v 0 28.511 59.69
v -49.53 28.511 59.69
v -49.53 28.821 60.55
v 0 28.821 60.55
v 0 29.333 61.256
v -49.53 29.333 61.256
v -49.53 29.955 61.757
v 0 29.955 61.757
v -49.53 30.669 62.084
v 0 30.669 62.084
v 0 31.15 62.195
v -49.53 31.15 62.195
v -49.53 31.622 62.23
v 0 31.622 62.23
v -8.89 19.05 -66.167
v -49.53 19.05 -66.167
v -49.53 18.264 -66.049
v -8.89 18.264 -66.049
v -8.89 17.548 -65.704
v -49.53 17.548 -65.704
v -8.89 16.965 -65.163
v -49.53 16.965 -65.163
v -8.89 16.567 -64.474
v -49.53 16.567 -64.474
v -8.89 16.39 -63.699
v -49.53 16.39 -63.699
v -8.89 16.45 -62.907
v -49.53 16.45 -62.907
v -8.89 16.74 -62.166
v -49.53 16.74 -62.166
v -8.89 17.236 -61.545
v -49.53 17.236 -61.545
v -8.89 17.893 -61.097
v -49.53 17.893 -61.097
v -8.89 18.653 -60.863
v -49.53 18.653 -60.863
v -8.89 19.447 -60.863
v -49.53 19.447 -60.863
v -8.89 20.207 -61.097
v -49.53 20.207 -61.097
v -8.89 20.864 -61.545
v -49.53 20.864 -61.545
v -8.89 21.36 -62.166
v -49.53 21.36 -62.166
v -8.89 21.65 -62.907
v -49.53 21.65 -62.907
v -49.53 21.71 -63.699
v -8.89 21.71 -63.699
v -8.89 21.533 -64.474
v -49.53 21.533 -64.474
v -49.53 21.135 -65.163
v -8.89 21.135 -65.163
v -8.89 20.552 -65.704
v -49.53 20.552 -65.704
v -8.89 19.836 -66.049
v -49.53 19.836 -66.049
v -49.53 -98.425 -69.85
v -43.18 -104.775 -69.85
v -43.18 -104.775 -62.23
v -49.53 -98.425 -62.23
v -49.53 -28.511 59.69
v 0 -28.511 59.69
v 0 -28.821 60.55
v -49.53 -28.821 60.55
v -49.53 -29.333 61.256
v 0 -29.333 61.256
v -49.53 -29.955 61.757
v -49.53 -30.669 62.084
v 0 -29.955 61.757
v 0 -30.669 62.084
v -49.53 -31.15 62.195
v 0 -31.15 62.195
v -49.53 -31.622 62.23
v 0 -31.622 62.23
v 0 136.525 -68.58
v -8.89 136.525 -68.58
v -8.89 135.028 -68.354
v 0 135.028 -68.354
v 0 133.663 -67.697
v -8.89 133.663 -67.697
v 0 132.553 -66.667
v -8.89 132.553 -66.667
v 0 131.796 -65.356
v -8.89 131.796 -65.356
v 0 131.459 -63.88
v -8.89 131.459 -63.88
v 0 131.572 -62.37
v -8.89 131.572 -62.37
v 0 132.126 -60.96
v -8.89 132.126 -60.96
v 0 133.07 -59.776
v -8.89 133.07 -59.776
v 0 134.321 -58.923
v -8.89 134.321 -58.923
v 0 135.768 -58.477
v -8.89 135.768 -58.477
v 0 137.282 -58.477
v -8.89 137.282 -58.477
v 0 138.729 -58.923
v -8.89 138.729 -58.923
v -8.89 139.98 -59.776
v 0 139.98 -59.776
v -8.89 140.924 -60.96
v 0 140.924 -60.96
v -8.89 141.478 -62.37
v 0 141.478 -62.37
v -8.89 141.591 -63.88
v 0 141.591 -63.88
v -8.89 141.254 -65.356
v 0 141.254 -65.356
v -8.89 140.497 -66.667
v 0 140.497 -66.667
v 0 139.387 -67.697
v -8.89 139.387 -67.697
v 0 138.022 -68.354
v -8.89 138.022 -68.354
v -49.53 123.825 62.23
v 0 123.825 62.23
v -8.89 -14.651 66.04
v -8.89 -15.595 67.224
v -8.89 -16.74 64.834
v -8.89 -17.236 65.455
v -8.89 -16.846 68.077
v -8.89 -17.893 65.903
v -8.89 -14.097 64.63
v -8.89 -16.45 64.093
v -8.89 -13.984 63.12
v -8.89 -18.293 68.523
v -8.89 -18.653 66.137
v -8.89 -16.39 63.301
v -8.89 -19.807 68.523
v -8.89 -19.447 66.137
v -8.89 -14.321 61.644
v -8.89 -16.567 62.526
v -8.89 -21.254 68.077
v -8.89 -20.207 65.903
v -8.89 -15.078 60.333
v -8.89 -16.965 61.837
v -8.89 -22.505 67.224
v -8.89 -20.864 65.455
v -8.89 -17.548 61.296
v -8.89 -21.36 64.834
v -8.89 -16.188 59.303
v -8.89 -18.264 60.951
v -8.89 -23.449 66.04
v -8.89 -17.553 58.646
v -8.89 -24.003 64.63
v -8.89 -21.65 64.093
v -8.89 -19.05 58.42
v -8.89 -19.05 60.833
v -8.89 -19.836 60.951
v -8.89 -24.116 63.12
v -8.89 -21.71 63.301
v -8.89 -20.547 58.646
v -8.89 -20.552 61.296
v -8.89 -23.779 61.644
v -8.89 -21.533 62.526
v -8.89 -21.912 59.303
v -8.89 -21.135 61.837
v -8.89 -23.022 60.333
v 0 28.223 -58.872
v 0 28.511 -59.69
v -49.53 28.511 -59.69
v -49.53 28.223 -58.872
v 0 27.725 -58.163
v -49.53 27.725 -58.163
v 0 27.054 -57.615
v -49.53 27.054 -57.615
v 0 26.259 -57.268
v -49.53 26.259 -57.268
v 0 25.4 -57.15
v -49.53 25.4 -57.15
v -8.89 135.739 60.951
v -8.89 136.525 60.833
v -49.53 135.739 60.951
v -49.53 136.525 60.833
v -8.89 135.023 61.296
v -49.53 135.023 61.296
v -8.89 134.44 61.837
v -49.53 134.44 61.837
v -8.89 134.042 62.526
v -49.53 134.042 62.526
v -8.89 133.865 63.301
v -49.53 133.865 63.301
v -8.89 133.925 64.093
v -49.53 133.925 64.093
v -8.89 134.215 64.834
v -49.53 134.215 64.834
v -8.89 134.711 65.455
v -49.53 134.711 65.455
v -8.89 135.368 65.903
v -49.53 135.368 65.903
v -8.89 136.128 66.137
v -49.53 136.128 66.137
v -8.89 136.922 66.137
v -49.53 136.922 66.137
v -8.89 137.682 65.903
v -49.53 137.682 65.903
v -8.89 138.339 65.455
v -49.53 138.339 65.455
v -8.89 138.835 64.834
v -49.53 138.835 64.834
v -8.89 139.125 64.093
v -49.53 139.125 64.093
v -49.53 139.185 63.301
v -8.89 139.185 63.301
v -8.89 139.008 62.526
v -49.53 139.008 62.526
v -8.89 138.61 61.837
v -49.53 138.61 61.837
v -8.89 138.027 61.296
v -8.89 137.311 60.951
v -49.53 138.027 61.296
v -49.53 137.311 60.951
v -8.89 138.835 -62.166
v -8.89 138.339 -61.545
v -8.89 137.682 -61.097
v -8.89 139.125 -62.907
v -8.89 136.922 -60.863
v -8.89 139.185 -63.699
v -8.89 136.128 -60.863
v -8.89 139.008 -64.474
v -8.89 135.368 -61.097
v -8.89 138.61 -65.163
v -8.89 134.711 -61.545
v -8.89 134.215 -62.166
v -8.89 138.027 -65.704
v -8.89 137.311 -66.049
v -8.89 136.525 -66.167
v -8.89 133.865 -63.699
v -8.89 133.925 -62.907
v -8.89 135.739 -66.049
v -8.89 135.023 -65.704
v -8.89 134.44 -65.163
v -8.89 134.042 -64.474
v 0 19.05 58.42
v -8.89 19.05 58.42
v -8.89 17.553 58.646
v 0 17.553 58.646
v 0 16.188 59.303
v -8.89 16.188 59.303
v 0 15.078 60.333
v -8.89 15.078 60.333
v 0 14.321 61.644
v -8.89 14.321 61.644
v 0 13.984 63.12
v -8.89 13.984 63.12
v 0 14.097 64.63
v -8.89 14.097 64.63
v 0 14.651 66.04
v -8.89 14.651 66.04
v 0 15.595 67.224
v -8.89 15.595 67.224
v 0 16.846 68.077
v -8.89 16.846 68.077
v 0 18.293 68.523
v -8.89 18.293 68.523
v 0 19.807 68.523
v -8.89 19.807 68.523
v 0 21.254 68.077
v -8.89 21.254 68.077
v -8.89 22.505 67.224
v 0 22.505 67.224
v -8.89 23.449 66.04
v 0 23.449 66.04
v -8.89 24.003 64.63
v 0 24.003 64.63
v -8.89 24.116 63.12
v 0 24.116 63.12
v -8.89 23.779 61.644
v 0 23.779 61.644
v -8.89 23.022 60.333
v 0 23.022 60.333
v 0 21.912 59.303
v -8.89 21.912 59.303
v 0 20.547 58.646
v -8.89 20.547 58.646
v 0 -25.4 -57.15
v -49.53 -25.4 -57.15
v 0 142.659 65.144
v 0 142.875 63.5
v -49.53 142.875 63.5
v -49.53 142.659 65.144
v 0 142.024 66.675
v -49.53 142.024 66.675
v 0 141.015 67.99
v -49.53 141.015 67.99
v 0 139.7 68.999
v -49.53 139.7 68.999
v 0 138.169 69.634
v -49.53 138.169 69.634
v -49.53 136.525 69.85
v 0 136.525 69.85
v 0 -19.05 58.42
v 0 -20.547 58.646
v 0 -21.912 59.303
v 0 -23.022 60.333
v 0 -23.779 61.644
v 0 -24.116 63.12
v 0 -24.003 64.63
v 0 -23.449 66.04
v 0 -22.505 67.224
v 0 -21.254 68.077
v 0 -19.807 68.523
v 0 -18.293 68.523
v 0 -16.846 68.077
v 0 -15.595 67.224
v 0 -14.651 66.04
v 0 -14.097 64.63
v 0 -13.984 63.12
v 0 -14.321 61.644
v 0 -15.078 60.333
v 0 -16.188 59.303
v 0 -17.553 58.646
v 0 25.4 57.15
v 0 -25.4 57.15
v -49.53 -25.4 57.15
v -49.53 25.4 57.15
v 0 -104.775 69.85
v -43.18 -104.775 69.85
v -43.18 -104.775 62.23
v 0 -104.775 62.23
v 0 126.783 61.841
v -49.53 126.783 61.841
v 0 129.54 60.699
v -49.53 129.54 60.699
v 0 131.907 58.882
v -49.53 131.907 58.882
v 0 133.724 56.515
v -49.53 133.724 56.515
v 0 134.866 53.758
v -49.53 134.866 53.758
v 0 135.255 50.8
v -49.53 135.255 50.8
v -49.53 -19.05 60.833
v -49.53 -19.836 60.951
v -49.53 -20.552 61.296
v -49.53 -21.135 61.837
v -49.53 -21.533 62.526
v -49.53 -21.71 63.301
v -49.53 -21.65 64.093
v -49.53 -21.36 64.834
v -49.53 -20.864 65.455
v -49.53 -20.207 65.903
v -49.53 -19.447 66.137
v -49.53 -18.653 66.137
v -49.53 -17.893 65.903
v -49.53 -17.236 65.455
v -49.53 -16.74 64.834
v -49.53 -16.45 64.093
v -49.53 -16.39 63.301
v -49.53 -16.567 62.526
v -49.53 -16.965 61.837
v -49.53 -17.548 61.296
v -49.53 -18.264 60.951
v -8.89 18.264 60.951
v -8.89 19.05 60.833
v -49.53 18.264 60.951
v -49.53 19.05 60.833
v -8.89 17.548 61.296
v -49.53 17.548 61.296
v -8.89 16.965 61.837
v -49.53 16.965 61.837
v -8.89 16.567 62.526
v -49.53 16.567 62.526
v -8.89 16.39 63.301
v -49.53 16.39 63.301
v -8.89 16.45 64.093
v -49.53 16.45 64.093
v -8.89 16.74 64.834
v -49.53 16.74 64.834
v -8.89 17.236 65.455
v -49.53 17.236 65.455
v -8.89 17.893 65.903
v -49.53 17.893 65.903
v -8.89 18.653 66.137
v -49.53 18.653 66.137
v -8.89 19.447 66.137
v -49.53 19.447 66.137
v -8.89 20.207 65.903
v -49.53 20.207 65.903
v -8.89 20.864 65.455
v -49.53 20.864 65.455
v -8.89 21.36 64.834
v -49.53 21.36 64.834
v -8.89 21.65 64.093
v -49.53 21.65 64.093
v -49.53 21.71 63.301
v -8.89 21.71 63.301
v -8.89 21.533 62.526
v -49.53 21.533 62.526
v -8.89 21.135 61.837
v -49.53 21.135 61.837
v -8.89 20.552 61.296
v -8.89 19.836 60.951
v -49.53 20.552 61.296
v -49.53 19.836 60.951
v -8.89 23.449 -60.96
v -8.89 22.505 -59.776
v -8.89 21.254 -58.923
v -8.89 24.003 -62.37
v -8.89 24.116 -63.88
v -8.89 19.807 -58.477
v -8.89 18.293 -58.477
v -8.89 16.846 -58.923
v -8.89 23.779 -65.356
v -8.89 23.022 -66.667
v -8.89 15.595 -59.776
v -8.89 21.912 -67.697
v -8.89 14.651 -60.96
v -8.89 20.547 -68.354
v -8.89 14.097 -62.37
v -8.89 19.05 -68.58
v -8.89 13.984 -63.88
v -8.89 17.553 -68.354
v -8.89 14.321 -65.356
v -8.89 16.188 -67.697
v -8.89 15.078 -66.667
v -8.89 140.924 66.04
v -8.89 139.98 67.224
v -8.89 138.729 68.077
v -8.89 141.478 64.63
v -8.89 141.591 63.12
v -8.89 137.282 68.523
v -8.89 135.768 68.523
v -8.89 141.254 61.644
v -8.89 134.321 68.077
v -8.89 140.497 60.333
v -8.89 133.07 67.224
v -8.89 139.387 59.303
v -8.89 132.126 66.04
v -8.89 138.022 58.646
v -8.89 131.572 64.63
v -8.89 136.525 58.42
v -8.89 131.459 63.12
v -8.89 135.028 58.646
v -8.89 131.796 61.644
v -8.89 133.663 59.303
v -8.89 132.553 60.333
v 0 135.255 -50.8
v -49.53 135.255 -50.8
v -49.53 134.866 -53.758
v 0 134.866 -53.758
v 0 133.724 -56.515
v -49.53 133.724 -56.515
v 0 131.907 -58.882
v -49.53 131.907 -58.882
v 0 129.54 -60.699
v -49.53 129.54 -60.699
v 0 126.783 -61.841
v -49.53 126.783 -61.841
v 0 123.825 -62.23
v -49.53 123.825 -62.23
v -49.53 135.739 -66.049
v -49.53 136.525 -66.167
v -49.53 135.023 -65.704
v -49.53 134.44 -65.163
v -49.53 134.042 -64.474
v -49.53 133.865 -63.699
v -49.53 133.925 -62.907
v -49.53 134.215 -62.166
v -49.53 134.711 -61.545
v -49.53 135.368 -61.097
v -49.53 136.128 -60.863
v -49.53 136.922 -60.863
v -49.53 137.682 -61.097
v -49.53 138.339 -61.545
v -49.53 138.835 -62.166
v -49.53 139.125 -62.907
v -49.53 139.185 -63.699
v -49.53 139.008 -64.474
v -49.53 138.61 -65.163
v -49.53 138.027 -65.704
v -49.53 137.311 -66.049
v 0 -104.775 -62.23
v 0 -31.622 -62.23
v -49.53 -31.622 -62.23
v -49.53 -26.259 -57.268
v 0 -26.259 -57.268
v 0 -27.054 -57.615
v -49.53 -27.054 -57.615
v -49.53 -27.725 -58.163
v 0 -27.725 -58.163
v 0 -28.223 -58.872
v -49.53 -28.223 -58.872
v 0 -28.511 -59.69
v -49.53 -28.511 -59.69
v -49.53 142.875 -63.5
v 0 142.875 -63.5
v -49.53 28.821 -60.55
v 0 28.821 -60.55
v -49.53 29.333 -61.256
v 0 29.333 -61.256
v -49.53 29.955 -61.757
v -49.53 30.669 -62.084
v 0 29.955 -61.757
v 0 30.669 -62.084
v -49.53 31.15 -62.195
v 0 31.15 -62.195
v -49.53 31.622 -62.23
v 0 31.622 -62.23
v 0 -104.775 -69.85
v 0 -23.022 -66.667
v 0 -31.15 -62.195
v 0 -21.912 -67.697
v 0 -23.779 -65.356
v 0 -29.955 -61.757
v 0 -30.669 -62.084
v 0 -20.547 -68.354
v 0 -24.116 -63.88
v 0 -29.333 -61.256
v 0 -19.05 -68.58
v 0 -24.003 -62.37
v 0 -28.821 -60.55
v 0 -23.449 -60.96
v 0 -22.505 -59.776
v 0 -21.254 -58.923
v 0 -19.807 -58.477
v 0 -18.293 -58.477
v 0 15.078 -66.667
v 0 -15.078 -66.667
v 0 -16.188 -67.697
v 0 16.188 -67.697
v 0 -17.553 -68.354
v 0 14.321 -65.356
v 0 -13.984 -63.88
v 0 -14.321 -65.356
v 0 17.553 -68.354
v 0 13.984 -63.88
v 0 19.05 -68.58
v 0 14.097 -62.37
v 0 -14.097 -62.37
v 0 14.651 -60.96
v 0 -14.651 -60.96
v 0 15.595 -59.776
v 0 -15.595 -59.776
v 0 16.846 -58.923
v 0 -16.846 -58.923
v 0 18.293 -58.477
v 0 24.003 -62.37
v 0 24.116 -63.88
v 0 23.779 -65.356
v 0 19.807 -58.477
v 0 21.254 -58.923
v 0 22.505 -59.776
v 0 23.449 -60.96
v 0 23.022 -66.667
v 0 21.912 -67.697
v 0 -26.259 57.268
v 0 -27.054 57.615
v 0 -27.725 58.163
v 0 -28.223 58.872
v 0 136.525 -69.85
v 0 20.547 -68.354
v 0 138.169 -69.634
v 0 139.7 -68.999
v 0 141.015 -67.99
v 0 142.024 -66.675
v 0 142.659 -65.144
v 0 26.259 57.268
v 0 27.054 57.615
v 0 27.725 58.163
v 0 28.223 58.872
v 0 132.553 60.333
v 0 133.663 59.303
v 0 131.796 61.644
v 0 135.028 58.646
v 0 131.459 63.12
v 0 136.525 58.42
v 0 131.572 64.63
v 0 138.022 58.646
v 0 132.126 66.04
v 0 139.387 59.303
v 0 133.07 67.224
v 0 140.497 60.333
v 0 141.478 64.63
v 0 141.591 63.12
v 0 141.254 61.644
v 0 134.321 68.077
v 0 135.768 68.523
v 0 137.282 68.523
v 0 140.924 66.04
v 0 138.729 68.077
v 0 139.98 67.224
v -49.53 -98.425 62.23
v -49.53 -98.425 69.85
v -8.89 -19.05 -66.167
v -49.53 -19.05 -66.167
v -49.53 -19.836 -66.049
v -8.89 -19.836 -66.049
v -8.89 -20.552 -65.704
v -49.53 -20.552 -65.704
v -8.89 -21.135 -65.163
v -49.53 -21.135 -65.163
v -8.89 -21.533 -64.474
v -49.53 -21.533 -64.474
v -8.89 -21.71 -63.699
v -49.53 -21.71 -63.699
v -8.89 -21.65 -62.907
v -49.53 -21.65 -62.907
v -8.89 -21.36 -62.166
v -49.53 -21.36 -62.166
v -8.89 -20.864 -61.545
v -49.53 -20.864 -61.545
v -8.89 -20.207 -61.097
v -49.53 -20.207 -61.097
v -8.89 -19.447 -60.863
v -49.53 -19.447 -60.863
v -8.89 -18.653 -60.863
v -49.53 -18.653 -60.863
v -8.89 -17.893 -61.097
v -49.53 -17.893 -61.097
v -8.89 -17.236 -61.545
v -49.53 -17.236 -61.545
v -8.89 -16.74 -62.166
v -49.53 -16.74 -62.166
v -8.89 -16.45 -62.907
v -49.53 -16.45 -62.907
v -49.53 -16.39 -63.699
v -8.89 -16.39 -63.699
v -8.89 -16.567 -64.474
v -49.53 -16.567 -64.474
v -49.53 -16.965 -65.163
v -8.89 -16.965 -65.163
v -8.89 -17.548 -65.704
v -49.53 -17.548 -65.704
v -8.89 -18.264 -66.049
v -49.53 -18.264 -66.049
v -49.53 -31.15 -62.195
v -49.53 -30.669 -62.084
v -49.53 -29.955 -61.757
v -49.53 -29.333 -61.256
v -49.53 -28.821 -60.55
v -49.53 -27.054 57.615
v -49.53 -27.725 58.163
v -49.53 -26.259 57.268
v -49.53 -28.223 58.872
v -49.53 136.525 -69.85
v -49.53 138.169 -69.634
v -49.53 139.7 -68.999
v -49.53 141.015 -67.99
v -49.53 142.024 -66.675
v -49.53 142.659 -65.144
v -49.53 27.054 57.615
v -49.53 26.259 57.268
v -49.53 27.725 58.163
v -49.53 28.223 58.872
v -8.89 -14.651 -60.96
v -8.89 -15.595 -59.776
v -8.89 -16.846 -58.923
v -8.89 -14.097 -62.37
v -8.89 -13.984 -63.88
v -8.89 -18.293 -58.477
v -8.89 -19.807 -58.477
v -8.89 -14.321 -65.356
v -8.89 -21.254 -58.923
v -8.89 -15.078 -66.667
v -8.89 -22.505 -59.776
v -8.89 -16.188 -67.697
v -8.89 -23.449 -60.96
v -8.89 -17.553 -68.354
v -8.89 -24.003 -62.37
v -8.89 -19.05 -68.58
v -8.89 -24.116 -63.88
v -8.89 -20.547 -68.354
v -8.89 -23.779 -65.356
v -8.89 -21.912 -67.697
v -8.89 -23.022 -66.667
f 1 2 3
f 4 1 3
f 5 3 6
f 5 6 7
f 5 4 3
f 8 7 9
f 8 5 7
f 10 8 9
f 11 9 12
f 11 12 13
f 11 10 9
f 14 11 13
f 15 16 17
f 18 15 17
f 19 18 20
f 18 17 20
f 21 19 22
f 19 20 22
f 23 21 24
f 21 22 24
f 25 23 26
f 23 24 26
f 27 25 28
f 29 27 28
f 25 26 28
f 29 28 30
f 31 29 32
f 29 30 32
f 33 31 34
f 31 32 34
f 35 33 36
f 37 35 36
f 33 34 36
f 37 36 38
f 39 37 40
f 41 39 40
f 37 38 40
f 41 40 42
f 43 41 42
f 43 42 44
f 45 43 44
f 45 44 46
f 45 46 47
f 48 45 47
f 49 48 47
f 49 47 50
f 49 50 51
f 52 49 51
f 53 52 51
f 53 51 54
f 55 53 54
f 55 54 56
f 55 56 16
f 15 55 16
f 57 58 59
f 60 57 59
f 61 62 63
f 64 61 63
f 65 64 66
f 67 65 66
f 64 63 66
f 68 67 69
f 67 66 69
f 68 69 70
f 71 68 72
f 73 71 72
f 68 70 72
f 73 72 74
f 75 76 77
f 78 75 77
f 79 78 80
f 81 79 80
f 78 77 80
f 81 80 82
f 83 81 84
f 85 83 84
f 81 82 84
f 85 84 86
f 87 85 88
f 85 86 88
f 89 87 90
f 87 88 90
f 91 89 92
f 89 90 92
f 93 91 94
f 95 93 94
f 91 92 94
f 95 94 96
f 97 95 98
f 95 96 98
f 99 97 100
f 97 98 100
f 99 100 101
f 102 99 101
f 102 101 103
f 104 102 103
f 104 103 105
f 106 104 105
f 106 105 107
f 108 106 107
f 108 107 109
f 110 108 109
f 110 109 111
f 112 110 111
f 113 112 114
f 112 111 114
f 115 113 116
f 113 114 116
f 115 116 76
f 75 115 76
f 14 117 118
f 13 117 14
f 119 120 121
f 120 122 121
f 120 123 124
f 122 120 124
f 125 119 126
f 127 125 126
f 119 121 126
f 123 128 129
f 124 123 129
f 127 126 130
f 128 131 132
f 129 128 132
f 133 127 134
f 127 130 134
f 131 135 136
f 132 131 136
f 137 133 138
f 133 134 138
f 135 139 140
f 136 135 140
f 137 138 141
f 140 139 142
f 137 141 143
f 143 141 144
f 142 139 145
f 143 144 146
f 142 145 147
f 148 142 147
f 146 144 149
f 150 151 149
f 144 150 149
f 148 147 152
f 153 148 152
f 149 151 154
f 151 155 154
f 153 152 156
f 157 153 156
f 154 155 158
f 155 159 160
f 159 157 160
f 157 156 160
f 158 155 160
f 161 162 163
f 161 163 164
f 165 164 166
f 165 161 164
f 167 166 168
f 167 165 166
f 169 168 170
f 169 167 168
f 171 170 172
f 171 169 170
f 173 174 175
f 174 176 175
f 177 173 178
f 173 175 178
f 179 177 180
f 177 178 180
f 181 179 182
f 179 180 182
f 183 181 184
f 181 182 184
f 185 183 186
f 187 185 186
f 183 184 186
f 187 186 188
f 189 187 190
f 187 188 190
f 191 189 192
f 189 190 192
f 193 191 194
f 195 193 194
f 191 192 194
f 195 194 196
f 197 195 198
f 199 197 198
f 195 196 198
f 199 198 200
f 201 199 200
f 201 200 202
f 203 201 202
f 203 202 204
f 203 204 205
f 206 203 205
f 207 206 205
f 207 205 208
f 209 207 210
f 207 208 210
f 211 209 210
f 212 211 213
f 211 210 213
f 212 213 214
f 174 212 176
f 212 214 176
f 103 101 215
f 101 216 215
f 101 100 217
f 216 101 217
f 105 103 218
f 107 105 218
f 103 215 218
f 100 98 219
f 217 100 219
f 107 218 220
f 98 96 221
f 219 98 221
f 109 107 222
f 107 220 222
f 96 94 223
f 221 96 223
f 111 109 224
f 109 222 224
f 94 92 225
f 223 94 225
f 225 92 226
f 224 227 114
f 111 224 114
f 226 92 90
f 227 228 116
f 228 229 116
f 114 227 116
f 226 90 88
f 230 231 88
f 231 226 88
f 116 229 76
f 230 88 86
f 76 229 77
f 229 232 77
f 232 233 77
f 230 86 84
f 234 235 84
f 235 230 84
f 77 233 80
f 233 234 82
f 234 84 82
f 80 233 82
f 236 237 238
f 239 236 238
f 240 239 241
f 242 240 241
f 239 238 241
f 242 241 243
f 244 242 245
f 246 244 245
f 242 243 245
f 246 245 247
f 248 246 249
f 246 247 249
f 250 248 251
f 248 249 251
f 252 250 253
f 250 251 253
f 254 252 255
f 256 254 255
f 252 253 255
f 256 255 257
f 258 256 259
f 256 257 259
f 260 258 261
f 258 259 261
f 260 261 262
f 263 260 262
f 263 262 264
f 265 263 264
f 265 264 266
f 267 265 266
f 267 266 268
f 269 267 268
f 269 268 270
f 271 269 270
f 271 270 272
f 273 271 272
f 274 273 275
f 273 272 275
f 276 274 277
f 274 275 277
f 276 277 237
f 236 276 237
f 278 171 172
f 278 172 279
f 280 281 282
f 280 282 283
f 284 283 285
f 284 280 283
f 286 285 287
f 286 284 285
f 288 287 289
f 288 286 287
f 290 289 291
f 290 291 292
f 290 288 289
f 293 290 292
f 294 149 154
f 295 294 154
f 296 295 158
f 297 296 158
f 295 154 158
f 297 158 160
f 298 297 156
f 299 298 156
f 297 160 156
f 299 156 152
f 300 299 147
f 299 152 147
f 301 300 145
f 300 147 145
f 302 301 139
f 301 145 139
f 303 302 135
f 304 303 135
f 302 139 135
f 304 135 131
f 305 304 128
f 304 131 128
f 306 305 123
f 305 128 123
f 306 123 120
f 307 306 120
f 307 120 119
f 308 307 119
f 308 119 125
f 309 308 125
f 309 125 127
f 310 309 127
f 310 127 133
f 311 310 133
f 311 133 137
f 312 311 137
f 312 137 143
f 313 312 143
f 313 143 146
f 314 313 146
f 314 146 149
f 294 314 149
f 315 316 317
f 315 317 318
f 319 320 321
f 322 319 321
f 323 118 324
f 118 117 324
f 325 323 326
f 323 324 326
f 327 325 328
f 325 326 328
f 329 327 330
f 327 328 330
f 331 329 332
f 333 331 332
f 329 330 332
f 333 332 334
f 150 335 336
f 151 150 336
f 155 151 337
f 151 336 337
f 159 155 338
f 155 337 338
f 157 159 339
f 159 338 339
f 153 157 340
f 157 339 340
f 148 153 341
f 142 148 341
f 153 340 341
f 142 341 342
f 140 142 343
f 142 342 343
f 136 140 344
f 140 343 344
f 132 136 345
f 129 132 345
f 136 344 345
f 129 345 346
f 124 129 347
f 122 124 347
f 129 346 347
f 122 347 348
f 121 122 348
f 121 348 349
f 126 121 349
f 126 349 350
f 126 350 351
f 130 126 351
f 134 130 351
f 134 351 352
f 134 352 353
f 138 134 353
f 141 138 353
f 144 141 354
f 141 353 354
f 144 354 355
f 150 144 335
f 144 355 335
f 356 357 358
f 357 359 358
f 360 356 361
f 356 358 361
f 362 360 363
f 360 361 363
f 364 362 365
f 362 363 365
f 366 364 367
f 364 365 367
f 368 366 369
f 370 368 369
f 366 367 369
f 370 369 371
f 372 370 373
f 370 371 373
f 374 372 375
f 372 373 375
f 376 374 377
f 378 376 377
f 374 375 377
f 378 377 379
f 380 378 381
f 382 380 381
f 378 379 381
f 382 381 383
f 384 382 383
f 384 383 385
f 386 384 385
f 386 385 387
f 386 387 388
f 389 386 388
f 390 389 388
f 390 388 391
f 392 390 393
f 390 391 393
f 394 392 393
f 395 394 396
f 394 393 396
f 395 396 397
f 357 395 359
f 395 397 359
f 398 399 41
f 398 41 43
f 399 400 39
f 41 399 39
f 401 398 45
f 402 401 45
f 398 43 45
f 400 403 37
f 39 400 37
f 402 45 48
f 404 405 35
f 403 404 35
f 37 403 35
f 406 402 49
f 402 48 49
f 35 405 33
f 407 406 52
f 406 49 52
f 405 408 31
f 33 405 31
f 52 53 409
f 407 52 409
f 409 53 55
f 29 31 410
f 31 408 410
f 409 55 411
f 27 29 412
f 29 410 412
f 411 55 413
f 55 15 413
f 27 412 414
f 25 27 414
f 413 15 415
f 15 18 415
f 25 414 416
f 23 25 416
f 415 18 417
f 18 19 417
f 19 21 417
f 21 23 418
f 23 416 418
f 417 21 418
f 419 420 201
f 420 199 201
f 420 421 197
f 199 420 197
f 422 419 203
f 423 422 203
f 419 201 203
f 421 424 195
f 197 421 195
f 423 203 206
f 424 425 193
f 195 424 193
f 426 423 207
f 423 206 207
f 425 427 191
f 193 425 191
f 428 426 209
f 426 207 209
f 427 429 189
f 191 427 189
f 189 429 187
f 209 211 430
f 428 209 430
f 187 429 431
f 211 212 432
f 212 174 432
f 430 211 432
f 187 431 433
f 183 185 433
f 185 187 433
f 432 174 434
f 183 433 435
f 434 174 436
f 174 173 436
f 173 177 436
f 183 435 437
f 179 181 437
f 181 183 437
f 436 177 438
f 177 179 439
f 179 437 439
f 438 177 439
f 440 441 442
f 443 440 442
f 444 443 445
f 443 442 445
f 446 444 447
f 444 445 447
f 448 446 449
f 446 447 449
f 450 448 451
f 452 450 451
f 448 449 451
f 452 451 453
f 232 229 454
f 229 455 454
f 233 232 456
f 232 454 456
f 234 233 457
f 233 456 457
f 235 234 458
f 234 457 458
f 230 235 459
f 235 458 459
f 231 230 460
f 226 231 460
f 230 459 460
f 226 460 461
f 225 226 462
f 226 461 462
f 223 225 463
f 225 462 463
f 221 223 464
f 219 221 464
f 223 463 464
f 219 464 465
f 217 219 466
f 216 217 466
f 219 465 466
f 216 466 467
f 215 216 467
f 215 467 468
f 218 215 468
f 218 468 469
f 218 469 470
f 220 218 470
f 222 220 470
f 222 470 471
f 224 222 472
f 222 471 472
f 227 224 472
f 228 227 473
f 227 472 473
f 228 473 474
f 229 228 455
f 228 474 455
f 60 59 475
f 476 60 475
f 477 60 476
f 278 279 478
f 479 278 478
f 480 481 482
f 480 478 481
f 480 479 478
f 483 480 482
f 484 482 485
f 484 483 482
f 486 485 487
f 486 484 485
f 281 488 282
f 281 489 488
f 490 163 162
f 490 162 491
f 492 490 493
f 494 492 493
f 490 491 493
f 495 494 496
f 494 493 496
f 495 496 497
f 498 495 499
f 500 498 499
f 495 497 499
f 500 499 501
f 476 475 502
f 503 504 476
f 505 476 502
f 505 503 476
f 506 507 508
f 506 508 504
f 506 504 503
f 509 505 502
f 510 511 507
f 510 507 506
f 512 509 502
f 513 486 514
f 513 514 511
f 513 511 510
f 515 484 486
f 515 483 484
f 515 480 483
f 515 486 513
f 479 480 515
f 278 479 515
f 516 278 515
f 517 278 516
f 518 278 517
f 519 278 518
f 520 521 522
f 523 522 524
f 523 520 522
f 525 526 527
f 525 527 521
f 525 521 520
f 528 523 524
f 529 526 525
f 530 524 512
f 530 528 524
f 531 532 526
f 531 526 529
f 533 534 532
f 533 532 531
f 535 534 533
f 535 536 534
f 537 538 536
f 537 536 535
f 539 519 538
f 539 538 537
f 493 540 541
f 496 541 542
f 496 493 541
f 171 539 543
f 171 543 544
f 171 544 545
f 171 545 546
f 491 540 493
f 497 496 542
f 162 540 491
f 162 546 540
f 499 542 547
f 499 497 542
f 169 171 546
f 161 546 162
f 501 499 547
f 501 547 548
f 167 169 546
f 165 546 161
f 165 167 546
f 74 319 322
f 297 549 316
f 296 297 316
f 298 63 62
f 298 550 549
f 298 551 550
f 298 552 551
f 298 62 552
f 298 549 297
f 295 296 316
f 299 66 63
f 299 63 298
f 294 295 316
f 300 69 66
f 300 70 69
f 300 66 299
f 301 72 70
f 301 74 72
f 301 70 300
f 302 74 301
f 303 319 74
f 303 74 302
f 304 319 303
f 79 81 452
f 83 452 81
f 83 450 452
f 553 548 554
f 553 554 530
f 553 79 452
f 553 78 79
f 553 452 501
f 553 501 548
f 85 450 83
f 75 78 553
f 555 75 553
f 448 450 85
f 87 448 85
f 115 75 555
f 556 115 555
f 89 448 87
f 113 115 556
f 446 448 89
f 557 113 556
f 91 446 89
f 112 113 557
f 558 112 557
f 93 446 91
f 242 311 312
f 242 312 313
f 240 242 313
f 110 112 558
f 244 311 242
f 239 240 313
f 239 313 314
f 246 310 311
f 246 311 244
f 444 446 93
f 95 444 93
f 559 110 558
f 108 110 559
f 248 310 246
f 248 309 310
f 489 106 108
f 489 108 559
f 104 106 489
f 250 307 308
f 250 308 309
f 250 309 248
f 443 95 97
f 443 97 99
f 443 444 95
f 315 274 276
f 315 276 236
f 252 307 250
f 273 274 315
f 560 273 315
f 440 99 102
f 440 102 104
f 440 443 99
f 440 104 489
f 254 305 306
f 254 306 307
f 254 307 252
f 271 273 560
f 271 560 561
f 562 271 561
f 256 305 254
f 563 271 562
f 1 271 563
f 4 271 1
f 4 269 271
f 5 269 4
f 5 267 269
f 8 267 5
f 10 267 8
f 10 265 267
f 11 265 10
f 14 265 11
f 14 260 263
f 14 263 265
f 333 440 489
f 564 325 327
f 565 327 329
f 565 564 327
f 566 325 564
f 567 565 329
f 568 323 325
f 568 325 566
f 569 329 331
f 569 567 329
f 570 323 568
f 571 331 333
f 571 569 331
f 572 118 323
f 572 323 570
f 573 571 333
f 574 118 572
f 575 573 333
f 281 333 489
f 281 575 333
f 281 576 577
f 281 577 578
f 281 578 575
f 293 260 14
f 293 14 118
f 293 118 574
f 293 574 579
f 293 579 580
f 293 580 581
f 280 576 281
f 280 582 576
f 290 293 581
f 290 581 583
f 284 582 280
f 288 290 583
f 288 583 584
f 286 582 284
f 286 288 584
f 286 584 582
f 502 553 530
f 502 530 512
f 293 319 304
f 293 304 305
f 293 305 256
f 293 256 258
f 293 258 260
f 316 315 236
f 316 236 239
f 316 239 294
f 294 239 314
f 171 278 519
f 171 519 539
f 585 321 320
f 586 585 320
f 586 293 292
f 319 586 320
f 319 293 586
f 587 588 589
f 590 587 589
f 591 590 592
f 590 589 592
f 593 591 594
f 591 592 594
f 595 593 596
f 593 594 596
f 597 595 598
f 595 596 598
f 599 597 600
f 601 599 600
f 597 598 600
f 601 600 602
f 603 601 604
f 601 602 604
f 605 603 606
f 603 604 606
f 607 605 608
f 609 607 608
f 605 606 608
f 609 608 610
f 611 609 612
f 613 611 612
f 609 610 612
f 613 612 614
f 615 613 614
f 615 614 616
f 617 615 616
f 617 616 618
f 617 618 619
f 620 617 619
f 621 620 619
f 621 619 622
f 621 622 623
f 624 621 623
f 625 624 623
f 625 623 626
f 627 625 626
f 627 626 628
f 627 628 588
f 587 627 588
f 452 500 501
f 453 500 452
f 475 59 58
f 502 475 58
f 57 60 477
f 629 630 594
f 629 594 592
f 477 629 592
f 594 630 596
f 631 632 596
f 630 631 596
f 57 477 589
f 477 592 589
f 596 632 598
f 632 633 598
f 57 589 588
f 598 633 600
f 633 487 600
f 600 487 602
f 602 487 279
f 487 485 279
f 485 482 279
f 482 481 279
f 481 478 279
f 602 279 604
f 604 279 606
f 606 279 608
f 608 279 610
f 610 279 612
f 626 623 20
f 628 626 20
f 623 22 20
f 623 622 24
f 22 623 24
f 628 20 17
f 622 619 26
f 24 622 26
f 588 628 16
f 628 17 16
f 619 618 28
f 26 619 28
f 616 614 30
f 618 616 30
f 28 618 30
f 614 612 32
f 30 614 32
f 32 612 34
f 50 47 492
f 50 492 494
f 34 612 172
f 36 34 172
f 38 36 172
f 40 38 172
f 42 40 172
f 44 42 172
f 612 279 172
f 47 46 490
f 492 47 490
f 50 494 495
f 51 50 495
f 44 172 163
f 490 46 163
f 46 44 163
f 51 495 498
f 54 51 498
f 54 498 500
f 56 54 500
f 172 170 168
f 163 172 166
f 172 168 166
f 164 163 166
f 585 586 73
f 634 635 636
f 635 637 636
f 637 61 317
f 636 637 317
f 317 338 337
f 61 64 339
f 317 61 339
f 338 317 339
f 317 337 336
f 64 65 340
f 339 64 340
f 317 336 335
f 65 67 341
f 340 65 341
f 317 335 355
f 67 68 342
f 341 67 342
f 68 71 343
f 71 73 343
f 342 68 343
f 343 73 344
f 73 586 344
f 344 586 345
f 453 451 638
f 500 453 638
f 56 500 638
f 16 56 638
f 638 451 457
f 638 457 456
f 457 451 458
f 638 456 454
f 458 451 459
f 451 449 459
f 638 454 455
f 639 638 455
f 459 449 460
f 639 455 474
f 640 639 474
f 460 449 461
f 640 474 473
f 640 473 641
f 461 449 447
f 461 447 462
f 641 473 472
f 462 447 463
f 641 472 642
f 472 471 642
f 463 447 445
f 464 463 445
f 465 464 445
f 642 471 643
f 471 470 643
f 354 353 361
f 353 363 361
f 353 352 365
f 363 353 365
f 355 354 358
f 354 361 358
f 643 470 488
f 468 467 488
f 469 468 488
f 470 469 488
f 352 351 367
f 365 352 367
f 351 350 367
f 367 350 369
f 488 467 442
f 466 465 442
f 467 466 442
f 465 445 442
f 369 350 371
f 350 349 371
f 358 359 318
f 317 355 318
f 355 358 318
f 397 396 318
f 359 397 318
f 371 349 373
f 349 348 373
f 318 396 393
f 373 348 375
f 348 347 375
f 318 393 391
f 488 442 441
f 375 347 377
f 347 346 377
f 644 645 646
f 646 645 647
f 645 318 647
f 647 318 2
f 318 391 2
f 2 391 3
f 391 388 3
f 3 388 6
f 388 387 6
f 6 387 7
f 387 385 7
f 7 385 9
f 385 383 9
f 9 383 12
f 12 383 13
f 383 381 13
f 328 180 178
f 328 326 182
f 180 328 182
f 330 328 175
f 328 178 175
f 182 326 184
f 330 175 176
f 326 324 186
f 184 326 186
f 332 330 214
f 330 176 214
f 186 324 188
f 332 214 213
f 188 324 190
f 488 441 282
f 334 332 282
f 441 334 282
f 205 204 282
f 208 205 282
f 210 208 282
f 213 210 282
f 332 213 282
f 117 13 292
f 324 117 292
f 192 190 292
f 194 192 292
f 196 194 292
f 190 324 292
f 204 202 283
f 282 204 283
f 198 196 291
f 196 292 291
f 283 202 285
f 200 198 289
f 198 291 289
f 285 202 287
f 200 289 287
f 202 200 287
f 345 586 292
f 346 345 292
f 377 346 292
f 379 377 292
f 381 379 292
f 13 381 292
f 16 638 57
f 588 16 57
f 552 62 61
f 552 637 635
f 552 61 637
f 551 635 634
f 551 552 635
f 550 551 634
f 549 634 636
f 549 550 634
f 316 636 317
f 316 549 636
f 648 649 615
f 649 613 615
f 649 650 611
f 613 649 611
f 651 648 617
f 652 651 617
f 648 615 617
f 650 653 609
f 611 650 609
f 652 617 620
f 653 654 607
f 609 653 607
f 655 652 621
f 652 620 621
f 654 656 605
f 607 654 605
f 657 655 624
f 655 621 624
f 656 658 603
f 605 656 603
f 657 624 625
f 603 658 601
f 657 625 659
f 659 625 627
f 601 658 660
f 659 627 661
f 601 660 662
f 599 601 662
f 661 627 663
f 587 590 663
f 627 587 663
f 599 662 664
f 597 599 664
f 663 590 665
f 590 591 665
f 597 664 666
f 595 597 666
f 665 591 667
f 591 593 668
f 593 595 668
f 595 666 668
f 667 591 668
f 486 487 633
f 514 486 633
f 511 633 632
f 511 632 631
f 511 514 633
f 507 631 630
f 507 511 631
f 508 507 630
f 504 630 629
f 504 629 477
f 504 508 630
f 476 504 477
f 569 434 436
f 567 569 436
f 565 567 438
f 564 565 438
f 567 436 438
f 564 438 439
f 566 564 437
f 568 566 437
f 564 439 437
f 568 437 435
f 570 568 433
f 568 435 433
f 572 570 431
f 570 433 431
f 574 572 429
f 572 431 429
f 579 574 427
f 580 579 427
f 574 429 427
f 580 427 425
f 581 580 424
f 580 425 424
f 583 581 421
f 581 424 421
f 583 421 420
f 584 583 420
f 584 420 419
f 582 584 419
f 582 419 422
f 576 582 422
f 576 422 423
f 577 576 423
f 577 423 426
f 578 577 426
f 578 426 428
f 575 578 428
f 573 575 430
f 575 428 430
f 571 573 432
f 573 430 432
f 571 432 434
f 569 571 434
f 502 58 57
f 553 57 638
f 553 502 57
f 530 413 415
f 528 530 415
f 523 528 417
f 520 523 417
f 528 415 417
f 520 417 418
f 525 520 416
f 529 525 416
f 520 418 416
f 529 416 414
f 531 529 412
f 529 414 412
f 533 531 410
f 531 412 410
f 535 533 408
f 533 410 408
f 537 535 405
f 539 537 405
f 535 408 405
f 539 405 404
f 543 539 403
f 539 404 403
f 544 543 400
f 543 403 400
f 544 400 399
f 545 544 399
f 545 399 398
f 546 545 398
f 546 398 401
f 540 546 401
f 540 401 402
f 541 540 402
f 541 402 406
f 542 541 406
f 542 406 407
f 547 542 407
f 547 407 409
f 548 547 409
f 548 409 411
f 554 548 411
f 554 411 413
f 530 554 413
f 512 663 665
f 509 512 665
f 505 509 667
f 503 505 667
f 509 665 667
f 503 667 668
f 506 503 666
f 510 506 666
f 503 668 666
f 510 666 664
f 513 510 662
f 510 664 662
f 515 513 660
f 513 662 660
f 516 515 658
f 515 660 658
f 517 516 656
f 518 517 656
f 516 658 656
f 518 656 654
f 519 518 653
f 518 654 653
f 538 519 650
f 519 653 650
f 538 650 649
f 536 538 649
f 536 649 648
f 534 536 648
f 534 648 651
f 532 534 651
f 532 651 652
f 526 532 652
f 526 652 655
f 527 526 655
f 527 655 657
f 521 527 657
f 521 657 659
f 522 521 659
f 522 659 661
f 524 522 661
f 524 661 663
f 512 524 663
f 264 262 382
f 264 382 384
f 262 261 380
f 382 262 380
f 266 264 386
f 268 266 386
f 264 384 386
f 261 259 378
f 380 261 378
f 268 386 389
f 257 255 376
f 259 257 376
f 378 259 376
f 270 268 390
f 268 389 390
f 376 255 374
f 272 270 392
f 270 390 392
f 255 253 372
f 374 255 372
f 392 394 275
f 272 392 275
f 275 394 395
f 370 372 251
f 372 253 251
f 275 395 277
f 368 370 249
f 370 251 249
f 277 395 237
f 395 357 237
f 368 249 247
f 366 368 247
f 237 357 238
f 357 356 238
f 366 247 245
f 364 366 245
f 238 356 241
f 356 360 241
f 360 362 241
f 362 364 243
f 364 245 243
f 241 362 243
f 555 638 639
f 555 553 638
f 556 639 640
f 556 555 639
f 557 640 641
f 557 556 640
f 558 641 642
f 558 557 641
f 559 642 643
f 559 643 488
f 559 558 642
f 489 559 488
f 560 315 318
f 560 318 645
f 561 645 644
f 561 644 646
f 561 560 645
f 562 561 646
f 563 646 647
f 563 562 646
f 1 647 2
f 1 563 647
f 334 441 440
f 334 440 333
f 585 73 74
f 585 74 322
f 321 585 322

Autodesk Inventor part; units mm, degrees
ref_plane "YZ Plane" through (0, 0, 0) normal (1, 0, 0) x (0, 1, 0)
ref_plane "XZ Plane" through (0, 0, 0) normal (0, 1, 0) x (-1, 0, 0)
ref_plane "XY Plane" through (0, 0, 0) normal (0, 0, 1) x (1, 0, 0)
sketch "Sketch1" plane through (0, 0, 0) normal (1, 0, 0) x (0, 1, 0)
  line L0 (0, 99.6312) -> (0, -99.6312) projected
  line L1 (-202.2597, 0) -> (204.2274, 0) projected
  line L2 (-136.525, -69.85) -> (136.525, -69.85)
  line L3 (142.875, -63.5) -> (142.875, 63.5)
  line L4 (136.525, 69.85) -> (-136.525, 69.85)
  line L5 (-142.875, 63.5) -> (-142.875, -63.5)
  line L6 (-142.875, -69.85) -> (142.875, 69.85) construction
  line L7 (142.875, -69.85) -> (-142.875, 69.85) construction
  arc A0 (142.875, 63.5) -> (136.525, 69.85) centre (136.525, 63.5) ccw
  arc A1 (136.525, -69.85) -> (142.875, -63.5) centre (136.525, -63.5) ccw
  arc A2 (-142.875, -63.5) -> (-136.525, -69.85) centre (-136.525, -63.5) ccw
  arc A3 (-136.525, 69.85) -> (-142.875, 63.5) centre (-136.525, 63.5) ccw
  line L8 (130.175, 57.15) -> (130.175, -57.15)
  line L9 (130.175, -57.15) -> (-130.175, -57.15)
  line L10 (-130.175, -57.15) -> (-130.175, 57.15)
  line L11 (-130.175, 57.15) -> (130.175, 57.15)
  line L12 (-136.525, 63.5) -> (136.525, 63.5) construction
  line L13 (136.525, 63.5) -> (136.525, -63.5) construction
  line L14 (136.525, -63.5) -> (-136.525, -63.5) construction
  line L15 (-136.525, -63.5) -> (-136.525, 63.5) construction
  line L16 (-136.525, 63.5) -> (136.525, -63.5) construction
  line L17 (136.525, 63.5) -> (-136.525, -63.5) construction
  point P0 (0, 0)
  point P1 (19.05, 63.5)
  point P2 (19.05, -63.5)
  point P3 (-19.05, 63.5)
  point P4 (-19.05, -63.5)
  dimension "d0" = 139.7
  dimension "d1" = 285.75
  dimension "d2" = 6.35
  dimension "d3" = 12.7
  dimension "d4" = 6.35
  dimension "d5" = 6.35
  dimension "d6" = 19.05
  dimension "d7" = 19.05
extrude "Extrusion1" add sketch "Sketch1" against normal blind 49.53 contours L4 A0 L3 L1 L8 L11 L0 | L0 L11 L10 L1 L5 A3 L4 | L9 L8 L1 L3 A1 L2 L0 | L0 L2 A2 L5 L1 L10 L9
fillet "Fillet1" radius 6.35 4 edges at (-24.765, 130.175, 57.15) (-24.765, 130.175, -57.15) (-24.765, -130.175, -57.15) (-24.765, -130.175, 57.15)
hole "Hole1" at (0, 136.525, 63.5) at (0, 136.525, -63.5) at (0, 19.05, 63.5) at (0, 19.05, -63.5) at (0, -19.05, 63.5) at (0, -19.05, -63.5) at (0, -136.525, 63.5) at (0, -136.525, -63.5) direction (-1, 0, 0) diameter 5.334 end through all counterbore diameter 10.16 counterbore depth 8.89
sketch "Sketch2" plane through (-49.53, 0, 0) normal (-1, 0, 0) x (0, 0, 1)
  line L0 (0, -202.2597) -> (0, 204.2274) projected
  line L1 (99.6312, 0) -> (-99.6312, 0) projected
  line L2 (119.4093, -203.1024) -> (-119.4093, -203.1024)
  line L3 (-119.4093, -203.1024) -> (-119.4093, 0)
  line L4 (-119.4093, 0) -> (119.4093, 0)
  line L5 (119.4093, 0) -> (119.4093, -203.1024)
  line L6 (119.4093, -203.1024) -> (-119.4093, 0) construction
  line L7 (-119.4093, -203.1024) -> (119.4093, 0) construction
  point P0 (0, 0)
  point P1 (0, -101.5512)
  point P2 (119.4093, 0)
  dimension "d18" = 0
extrude "Extrusion2" [suppressed]
sketch "Sketch3" plane through (-34.925, 0, -69.85) normal (0, -1, 0) x (1, 0, 0)
  line L0 (0, 12.7) -> (34.925, 12.7) projected
  line L1 (0, 0) -> (0, 12.7) projected
  line L2 (34.925, 0) -> (0, 0) projected
  line L3 (34.925, 12.7) -> (34.925, 0) projected
  line L4 (34.925, 127) -> (0, 127) projected
  line L5 (34.925, 139.7) -> (34.925, 127) projected
  line L6 (0, 139.7) -> (34.925, 139.7) projected
  line L7 (0, 127) -> (0, 139.7) projected
  line L8 (0, 133.35) -> (0, 6.35) construction
  line L9 (34.925, 6.35) -> (0, 6.35) construction
  line L10 (0, 6.35) -> (34.925, 6.35) construction
  line L11 (0, 133.35) -> (34.925, 133.35) construction
  line L12 (34.925, 135.417) -> (34.925, 131.283) construction
  line L13 (34.925, 133.35) -> (0, 133.35) construction
  point P0 (34.925, 69.85)
  point P1 (7.62, 6.35)
  point P2 (27.305, 6.35)
  point P3 (27.305, 133.35)
  point P4 (7.62, 133.35)
  dimension "d21" = 7.62
  dimension "d22" = 7.62
  dimension "d23" = 7.62
  dimension "d24" = 7.62
hole "Hole2" [suppressed]
chamfer "Chamfer1" [suppressed]
sketch "Sketch4" plane through (-49.53, 0, 0) normal (-1, 0, 0) x (0, 0, 1)
  line L0 (0, -202.2597) -> (0, 204.2274) projected
  line L1 (99.6312, 0) -> (-99.6312, 0) projected
  line L2 (116.354, -104.775) -> (-116.354, -104.775)
  line L3 (-116.354, -104.775) -> (-116.354, -199.2224)
  line L4 (-116.354, -199.2224) -> (116.354, -199.2224)
  line L5 (116.354, -199.2224) -> (116.354, -104.775)
  line L6 (116.354, -104.775) -> (-116.354, -199.2224) construction
  line L7 (-116.354, -104.775) -> (116.354, -199.2224) construction
  line L8 (63.5, 142.875) -> (-63.5, 142.875) projected
  point P0 (0, 0)
  point P1 (0, -151.9987)
  dimension "d35" = 247.65
extrude "Extrusion3" cut sketch "Sketch4" against normal through all
sketch "Sketch5" plane through (-49.53, 0, 0) normal (-1, 0, 0) x (0, 0, 1)
  line L0 (-57.15, -104.775) -> (-57.15, 123.825) projected
  line L1 (-50.8, 130.175) -> (50.8, 130.175) projected
  line L2 (57.15, 123.825) -> (57.15, -104.775) projected
  line L3 (0, -202.2597) -> (0, 204.2274) projected
  arc A0 (-50.8, 130.175) -> (-57.15, 123.825) centre (-50.8, 123.825) ccw projected
  arc A1 (57.15, 123.825) -> (50.8, 130.175) centre (50.8, 123.825) ccw projected
  line L4 (-62.23, -104.775) -> (-62.23, 123.825)
  arc A2 (-50.8, 135.255) -> (-62.23, 123.825) centre (-50.8, 123.825) ccw
  line L5 (-50.8, 135.255) -> (50.8, 135.255)
  arc A3 (62.23, 123.825) -> (50.8, 135.255) centre (50.8, 123.825) ccw
  line L6 (62.23, 123.825) -> (62.23, -104.775)
  line L7 (62.23, -28.575) -> (-62.23, -28.575)
  line L8 (-62.23, -28.575) -> (-62.23, 28.575)
  line L9 (-62.23, 28.575) -> (62.23, 28.575)
  line L10 (62.23, 28.575) -> (62.23, -28.575)
  line L11 (62.23, -28.575) -> (-62.23, 28.575) construction
  line L12 (-62.23, -28.575) -> (62.23, 28.575) construction
  line L13 (-69.85, -104.775) -> (-57.15, -104.775) projected
  line L14 (57.15, -104.775) -> (69.85, -104.775) projected
  point P0 (0, 0)
  point P1 (57.15, 28.575)
  point P2 (-57.15, 28.575)
  point P3 (57.15, -28.575)
  point P4 (-57.15, -28.575)
  dimension "d38" = 5.08
  dimension "d39" = 57.15
extrude "Extrusion4" cut sketch "Sketch5" against normal through all contours L13 L4 L7 L0 | L9 L4 A2 L5 L3 L1 A0 L0 | L7 L6 L14 L2 | L3 L5 A3 L6 L9 L2 A1 L1
fillet "Fillet2" radius 3.175 8 edges at (-24.765, -28.575, -57.15) (-24.765, -28.575, -62.23) (-24.765, 28.575, -57.15) (-24.765, 28.575, -62.23) (-24.765, -28.575, 57.15) (-24.765, -28.575, 62.23) (-24.765, 28.575, 57.15) (-24.765, 28.575, 62.23)
chamfer "Chamfer2" distance 6.35 angle 45 2 edges at (-49.53, -104.775, -66.04) (-49.53, -104.775, 66.04)
sketch "Sketch6" plane through (-49.53, 0, 0) normal (-1, 0, 0) x (0, 0, 1)
  line L0 (69.0599, 146.1578) -> (-63.5, 146.1578) construction
  line L1 (-63.5, 146.1578) -> (-63.5, -84.3884) construction
  line L2 (-63.5, -84.3884) -> (69.0599, -84.3884) construction
  line L3 (69.0599, -84.3884) -> (69.0599, 146.1578) construction
  line L4 (69.0599, 146.1578) -> (-63.5, -84.3884) construction
  line L5 (-63.5, 146.1578) -> (69.0599, -84.3884) construction
  point P0 (0, 0)
  point P1 (2.7799, 30.8847)
  point P2 (63.5, -19.05)
  point P3 (-63.5, 136.525)
